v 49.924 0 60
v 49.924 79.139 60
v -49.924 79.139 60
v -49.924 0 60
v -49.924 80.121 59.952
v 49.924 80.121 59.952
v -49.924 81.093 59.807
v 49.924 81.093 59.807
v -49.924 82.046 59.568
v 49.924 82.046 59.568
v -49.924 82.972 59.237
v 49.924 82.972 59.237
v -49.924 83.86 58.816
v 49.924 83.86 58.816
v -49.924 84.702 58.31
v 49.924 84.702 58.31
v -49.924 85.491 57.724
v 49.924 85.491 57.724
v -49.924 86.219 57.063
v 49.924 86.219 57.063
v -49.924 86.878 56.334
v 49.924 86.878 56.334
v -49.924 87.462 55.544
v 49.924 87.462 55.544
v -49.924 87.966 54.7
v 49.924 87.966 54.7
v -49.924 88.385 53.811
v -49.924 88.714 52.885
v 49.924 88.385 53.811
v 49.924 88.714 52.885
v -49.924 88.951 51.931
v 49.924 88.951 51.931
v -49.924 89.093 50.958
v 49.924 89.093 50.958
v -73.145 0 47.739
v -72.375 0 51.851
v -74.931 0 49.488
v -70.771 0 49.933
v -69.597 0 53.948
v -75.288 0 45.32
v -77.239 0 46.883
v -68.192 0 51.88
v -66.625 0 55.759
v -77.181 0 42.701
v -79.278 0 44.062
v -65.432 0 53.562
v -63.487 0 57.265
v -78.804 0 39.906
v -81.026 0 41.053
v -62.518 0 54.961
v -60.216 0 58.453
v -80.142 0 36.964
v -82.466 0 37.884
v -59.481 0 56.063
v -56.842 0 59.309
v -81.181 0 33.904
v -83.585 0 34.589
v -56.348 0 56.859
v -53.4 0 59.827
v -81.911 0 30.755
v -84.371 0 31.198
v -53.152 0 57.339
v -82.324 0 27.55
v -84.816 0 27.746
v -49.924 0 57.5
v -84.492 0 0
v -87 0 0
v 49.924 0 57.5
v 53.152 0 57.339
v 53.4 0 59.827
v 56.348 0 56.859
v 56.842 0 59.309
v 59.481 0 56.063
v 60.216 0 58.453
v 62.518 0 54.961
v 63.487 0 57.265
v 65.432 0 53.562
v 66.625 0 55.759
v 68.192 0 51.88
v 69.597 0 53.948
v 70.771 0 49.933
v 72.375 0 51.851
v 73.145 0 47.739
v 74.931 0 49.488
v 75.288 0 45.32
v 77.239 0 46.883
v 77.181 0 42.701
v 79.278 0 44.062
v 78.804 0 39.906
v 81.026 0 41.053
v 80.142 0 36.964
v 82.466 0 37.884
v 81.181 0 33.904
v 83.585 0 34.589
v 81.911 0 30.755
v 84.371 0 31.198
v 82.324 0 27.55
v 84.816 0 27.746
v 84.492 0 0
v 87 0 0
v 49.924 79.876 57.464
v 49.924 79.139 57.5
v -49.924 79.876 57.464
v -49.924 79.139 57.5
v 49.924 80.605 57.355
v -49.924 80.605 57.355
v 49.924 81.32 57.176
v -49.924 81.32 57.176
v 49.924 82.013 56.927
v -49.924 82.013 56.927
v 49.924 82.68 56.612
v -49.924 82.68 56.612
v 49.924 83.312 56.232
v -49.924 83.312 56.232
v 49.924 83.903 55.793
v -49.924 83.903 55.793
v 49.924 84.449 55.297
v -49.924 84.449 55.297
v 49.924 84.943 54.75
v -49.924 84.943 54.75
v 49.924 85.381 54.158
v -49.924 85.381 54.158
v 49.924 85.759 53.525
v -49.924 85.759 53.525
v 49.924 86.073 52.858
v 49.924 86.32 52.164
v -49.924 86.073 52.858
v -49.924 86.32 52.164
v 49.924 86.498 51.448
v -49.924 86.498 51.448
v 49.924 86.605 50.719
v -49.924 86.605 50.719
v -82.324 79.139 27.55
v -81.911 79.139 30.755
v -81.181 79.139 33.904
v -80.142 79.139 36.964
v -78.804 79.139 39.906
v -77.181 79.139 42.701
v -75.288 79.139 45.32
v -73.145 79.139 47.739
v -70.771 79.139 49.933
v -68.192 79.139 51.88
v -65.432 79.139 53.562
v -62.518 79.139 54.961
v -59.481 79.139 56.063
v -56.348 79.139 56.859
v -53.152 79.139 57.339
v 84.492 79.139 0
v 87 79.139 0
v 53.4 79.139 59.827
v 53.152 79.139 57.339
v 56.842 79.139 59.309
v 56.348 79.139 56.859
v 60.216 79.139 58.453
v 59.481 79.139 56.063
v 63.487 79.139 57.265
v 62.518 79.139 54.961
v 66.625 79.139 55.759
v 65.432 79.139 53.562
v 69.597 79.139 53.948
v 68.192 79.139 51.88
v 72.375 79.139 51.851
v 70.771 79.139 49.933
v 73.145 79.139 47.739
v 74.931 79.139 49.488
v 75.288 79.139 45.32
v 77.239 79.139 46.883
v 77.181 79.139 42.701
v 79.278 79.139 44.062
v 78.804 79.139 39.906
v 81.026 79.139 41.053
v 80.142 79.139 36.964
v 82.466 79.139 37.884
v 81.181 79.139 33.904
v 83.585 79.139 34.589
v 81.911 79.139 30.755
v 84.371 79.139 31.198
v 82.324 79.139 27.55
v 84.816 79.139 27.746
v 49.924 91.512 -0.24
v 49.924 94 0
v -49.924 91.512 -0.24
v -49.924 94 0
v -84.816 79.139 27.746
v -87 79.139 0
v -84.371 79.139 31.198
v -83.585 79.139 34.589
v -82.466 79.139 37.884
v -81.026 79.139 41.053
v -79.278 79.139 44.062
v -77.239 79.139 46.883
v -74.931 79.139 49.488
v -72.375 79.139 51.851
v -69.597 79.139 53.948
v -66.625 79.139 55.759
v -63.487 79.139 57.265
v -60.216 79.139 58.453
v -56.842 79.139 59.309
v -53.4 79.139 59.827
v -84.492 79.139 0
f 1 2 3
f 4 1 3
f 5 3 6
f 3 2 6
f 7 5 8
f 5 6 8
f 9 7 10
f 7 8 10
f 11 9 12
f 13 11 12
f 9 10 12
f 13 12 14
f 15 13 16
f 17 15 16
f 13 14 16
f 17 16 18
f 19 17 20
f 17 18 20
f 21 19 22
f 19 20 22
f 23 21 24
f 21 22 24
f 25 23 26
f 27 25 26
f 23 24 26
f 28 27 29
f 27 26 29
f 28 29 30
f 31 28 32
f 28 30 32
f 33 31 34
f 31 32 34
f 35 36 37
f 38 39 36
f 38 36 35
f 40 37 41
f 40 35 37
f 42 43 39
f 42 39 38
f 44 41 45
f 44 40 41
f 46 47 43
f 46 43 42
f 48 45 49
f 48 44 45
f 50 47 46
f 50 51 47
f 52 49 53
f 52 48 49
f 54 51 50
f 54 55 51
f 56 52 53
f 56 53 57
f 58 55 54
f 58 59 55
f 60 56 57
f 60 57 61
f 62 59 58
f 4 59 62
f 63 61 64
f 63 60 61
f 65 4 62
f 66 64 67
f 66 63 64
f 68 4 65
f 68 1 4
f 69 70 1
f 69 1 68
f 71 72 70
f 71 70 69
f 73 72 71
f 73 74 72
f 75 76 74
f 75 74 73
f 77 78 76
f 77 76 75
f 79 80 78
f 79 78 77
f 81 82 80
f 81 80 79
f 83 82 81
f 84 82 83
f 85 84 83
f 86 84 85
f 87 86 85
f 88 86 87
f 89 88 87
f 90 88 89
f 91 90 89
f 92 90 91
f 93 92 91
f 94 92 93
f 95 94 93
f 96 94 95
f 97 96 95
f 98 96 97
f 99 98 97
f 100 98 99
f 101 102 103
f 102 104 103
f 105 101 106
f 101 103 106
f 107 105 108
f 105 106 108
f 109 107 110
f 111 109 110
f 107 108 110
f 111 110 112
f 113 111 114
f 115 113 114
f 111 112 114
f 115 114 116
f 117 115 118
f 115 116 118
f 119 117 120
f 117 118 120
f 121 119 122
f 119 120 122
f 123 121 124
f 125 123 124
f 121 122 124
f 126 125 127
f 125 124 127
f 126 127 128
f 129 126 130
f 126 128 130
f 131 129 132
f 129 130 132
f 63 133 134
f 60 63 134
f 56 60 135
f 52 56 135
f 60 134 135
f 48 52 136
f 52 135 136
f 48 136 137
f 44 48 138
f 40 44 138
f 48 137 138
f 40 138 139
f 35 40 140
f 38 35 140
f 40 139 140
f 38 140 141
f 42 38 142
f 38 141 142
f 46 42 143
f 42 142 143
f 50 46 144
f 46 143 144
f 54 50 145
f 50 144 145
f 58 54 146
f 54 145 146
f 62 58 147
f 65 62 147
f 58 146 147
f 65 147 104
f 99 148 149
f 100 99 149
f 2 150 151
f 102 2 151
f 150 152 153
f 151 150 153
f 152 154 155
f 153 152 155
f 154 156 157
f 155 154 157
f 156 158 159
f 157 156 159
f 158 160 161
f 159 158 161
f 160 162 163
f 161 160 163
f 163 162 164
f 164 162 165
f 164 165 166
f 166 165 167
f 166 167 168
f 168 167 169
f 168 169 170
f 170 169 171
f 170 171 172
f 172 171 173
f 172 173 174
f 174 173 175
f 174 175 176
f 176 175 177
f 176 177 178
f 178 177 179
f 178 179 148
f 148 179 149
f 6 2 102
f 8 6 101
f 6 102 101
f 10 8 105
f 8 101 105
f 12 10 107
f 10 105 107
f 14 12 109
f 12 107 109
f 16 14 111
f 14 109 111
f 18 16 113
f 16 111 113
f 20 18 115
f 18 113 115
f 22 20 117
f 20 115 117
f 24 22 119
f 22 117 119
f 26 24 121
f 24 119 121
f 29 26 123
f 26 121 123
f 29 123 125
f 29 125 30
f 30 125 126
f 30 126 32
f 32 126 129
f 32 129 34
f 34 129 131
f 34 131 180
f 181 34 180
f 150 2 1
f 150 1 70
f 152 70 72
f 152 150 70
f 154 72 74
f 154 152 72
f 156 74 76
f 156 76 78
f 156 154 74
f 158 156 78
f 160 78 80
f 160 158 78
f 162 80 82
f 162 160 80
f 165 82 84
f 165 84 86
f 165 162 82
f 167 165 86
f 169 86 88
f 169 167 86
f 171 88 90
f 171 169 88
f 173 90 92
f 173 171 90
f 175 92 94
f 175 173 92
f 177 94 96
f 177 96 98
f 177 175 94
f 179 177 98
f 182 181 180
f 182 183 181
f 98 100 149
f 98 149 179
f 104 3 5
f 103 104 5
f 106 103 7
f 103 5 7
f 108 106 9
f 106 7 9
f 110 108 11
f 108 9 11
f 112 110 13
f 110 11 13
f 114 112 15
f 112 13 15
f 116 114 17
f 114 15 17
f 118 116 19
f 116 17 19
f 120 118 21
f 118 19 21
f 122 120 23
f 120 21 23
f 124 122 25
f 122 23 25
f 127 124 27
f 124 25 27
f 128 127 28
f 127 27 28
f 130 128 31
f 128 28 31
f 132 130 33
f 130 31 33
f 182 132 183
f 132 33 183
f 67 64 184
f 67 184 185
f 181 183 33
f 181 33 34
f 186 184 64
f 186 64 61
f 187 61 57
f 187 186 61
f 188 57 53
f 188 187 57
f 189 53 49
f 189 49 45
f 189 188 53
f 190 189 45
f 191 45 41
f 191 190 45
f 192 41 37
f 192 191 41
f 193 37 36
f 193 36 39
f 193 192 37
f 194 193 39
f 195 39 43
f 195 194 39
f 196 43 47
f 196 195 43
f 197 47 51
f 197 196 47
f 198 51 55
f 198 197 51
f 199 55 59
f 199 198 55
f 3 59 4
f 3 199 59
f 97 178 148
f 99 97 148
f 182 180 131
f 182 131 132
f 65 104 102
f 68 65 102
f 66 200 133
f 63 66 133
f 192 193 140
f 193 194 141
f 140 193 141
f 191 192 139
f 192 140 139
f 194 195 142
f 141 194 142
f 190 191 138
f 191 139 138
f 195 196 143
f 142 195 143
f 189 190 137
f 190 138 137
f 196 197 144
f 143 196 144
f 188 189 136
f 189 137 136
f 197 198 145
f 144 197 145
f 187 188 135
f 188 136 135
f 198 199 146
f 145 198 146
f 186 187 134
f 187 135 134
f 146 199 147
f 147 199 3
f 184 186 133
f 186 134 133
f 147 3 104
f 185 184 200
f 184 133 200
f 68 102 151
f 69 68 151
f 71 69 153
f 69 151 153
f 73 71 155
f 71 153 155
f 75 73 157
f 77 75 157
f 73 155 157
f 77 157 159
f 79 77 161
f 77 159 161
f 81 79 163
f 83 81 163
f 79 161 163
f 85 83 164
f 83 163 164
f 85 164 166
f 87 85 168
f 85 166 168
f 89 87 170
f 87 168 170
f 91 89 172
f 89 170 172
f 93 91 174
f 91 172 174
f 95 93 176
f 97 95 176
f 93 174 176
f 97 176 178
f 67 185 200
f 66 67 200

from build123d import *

# Parameters (mm, degrees)
F4_W = 99.84846
F4_H = 2.5


with BuildPart() as f3:
    # F3: sweep along a path in F2
    with BuildLine(Plane.YZ) as f3_path:
        Line((0, 60), (79.139297, 60))
    # F0 (on Front) → F3 (sweep)
    with BuildSketch(Plane.XZ):
        with BuildLine():
            Line((-84.816337, 27.746068), (-87, 0))
            Line((-87, 0), (-84.49227, 0))
            Line((-84.49227, 0), (-82.324044, 27.549921))
            ThreePointArc((-82.324044, 27.549921), (-71.985255, 48.865482), (-49.92423, 57.5))
            Line((-49.92423, 57.5), (0, 57.5))
            Line((0, 57.5), (49.92423, 57.5))
            ThreePointArc((49.92423, 57.5), (71.985255, 48.865482), (82.324044, 27.549921))
            Line((82.324044, 27.549921), (84.49227, 0))
            Line((84.49227, 0), (87, 0))
            Line((87, 0), (84.816337, 27.746068))
            ThreePointArc((84.816337, 27.746068), (73.682256, 50.701288), (49.92423, 60))
            Line((49.92423, 60), (0, 60))
            Line((0, 60), (-49.92423, 60))
            ThreePointArc((-49.92423, 60), (-73.682256, 50.701288), (-84.816337, 27.746068))
        make_face()
    sweep(path=f3_path.line)

    # F5: sweep along a path in F2
    with BuildLine(Plane.YZ) as f5_path:
        ThreePointArc((79.139297, 60), (85.862965, 57.402181), (89.093259, 50.958458))
        Line((89.093259, 50.958458), (94, 0))
    # F4 (on face) → F5 (sweep)
    with BuildSketch(Plane(origin=(0, 79.139297, 0), x_dir=(-1, 0, 0), z_dir=(0, 1, 0))):
        with Locations((0, 58.75)):
            Rectangle(F4_W, F4_H)
    sweep(path=f5_path.line)


solid = f3.part
